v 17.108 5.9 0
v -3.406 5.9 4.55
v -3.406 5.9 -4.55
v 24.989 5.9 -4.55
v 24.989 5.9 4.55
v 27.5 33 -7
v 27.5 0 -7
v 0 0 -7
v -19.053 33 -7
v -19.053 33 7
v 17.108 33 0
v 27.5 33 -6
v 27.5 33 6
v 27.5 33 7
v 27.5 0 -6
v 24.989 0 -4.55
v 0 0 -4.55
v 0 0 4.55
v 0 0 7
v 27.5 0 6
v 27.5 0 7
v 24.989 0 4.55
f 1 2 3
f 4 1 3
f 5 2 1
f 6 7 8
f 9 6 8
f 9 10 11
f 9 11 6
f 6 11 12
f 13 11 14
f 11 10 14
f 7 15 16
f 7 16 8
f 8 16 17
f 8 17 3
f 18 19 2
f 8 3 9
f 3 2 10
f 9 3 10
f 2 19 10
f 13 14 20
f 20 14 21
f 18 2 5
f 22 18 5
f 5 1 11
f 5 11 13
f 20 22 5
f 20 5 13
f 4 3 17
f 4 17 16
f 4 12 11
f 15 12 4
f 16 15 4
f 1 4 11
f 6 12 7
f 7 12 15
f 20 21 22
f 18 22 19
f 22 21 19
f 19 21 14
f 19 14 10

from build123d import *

# Parameters (mm, degrees)
EXTRUDE003_DEPTH = 33
SKETCH001_W      = 34.669946
SKETCH001_H      = 5.9
EXTRUDE001_DEPTH = 4.55
EXTRUDE_DEPTH    = 7


with BuildPart() as extrude003:
    # Sketch002 (on Cut) → Extrude003 (new body)
    with BuildSketch(Plane.XZ):
        Polygon((27.5, 6), (27.5, -6), (17.107695, 0), align=None)
    extrude(amount=-EXTRUDE003_DEPTH)


with BuildPart() as extrude001:
    # Sketch001 (on Extrude) → Extrude001 (new body, symmetric)
    with BuildSketch(Plane.XY):
        with Locations((12.538995, 2.95)):
            Rectangle(SKETCH001_W, SKETCH001_H)
    extrude(amount=EXTRUDE001_DEPTH, both=True)


with BuildPart() as cut001:
    # Sketch → Extrude (new body, symmetric)
    with BuildSketch(Plane.XY):
        Polygon((0, 0), (-19.052559, 33), (27.5, 33), (27.5, 0), align=None)
    extrude(amount=EXTRUDE_DEPTH, both=True)

    # Cut: cut Extrude001
    add(extrude001.part, mode=Mode.SUBTRACT)

    # Cut001: cut Extrude003
    add(extrude003.part, mode=Mode.SUBTRACT)


solid = cut001.part
